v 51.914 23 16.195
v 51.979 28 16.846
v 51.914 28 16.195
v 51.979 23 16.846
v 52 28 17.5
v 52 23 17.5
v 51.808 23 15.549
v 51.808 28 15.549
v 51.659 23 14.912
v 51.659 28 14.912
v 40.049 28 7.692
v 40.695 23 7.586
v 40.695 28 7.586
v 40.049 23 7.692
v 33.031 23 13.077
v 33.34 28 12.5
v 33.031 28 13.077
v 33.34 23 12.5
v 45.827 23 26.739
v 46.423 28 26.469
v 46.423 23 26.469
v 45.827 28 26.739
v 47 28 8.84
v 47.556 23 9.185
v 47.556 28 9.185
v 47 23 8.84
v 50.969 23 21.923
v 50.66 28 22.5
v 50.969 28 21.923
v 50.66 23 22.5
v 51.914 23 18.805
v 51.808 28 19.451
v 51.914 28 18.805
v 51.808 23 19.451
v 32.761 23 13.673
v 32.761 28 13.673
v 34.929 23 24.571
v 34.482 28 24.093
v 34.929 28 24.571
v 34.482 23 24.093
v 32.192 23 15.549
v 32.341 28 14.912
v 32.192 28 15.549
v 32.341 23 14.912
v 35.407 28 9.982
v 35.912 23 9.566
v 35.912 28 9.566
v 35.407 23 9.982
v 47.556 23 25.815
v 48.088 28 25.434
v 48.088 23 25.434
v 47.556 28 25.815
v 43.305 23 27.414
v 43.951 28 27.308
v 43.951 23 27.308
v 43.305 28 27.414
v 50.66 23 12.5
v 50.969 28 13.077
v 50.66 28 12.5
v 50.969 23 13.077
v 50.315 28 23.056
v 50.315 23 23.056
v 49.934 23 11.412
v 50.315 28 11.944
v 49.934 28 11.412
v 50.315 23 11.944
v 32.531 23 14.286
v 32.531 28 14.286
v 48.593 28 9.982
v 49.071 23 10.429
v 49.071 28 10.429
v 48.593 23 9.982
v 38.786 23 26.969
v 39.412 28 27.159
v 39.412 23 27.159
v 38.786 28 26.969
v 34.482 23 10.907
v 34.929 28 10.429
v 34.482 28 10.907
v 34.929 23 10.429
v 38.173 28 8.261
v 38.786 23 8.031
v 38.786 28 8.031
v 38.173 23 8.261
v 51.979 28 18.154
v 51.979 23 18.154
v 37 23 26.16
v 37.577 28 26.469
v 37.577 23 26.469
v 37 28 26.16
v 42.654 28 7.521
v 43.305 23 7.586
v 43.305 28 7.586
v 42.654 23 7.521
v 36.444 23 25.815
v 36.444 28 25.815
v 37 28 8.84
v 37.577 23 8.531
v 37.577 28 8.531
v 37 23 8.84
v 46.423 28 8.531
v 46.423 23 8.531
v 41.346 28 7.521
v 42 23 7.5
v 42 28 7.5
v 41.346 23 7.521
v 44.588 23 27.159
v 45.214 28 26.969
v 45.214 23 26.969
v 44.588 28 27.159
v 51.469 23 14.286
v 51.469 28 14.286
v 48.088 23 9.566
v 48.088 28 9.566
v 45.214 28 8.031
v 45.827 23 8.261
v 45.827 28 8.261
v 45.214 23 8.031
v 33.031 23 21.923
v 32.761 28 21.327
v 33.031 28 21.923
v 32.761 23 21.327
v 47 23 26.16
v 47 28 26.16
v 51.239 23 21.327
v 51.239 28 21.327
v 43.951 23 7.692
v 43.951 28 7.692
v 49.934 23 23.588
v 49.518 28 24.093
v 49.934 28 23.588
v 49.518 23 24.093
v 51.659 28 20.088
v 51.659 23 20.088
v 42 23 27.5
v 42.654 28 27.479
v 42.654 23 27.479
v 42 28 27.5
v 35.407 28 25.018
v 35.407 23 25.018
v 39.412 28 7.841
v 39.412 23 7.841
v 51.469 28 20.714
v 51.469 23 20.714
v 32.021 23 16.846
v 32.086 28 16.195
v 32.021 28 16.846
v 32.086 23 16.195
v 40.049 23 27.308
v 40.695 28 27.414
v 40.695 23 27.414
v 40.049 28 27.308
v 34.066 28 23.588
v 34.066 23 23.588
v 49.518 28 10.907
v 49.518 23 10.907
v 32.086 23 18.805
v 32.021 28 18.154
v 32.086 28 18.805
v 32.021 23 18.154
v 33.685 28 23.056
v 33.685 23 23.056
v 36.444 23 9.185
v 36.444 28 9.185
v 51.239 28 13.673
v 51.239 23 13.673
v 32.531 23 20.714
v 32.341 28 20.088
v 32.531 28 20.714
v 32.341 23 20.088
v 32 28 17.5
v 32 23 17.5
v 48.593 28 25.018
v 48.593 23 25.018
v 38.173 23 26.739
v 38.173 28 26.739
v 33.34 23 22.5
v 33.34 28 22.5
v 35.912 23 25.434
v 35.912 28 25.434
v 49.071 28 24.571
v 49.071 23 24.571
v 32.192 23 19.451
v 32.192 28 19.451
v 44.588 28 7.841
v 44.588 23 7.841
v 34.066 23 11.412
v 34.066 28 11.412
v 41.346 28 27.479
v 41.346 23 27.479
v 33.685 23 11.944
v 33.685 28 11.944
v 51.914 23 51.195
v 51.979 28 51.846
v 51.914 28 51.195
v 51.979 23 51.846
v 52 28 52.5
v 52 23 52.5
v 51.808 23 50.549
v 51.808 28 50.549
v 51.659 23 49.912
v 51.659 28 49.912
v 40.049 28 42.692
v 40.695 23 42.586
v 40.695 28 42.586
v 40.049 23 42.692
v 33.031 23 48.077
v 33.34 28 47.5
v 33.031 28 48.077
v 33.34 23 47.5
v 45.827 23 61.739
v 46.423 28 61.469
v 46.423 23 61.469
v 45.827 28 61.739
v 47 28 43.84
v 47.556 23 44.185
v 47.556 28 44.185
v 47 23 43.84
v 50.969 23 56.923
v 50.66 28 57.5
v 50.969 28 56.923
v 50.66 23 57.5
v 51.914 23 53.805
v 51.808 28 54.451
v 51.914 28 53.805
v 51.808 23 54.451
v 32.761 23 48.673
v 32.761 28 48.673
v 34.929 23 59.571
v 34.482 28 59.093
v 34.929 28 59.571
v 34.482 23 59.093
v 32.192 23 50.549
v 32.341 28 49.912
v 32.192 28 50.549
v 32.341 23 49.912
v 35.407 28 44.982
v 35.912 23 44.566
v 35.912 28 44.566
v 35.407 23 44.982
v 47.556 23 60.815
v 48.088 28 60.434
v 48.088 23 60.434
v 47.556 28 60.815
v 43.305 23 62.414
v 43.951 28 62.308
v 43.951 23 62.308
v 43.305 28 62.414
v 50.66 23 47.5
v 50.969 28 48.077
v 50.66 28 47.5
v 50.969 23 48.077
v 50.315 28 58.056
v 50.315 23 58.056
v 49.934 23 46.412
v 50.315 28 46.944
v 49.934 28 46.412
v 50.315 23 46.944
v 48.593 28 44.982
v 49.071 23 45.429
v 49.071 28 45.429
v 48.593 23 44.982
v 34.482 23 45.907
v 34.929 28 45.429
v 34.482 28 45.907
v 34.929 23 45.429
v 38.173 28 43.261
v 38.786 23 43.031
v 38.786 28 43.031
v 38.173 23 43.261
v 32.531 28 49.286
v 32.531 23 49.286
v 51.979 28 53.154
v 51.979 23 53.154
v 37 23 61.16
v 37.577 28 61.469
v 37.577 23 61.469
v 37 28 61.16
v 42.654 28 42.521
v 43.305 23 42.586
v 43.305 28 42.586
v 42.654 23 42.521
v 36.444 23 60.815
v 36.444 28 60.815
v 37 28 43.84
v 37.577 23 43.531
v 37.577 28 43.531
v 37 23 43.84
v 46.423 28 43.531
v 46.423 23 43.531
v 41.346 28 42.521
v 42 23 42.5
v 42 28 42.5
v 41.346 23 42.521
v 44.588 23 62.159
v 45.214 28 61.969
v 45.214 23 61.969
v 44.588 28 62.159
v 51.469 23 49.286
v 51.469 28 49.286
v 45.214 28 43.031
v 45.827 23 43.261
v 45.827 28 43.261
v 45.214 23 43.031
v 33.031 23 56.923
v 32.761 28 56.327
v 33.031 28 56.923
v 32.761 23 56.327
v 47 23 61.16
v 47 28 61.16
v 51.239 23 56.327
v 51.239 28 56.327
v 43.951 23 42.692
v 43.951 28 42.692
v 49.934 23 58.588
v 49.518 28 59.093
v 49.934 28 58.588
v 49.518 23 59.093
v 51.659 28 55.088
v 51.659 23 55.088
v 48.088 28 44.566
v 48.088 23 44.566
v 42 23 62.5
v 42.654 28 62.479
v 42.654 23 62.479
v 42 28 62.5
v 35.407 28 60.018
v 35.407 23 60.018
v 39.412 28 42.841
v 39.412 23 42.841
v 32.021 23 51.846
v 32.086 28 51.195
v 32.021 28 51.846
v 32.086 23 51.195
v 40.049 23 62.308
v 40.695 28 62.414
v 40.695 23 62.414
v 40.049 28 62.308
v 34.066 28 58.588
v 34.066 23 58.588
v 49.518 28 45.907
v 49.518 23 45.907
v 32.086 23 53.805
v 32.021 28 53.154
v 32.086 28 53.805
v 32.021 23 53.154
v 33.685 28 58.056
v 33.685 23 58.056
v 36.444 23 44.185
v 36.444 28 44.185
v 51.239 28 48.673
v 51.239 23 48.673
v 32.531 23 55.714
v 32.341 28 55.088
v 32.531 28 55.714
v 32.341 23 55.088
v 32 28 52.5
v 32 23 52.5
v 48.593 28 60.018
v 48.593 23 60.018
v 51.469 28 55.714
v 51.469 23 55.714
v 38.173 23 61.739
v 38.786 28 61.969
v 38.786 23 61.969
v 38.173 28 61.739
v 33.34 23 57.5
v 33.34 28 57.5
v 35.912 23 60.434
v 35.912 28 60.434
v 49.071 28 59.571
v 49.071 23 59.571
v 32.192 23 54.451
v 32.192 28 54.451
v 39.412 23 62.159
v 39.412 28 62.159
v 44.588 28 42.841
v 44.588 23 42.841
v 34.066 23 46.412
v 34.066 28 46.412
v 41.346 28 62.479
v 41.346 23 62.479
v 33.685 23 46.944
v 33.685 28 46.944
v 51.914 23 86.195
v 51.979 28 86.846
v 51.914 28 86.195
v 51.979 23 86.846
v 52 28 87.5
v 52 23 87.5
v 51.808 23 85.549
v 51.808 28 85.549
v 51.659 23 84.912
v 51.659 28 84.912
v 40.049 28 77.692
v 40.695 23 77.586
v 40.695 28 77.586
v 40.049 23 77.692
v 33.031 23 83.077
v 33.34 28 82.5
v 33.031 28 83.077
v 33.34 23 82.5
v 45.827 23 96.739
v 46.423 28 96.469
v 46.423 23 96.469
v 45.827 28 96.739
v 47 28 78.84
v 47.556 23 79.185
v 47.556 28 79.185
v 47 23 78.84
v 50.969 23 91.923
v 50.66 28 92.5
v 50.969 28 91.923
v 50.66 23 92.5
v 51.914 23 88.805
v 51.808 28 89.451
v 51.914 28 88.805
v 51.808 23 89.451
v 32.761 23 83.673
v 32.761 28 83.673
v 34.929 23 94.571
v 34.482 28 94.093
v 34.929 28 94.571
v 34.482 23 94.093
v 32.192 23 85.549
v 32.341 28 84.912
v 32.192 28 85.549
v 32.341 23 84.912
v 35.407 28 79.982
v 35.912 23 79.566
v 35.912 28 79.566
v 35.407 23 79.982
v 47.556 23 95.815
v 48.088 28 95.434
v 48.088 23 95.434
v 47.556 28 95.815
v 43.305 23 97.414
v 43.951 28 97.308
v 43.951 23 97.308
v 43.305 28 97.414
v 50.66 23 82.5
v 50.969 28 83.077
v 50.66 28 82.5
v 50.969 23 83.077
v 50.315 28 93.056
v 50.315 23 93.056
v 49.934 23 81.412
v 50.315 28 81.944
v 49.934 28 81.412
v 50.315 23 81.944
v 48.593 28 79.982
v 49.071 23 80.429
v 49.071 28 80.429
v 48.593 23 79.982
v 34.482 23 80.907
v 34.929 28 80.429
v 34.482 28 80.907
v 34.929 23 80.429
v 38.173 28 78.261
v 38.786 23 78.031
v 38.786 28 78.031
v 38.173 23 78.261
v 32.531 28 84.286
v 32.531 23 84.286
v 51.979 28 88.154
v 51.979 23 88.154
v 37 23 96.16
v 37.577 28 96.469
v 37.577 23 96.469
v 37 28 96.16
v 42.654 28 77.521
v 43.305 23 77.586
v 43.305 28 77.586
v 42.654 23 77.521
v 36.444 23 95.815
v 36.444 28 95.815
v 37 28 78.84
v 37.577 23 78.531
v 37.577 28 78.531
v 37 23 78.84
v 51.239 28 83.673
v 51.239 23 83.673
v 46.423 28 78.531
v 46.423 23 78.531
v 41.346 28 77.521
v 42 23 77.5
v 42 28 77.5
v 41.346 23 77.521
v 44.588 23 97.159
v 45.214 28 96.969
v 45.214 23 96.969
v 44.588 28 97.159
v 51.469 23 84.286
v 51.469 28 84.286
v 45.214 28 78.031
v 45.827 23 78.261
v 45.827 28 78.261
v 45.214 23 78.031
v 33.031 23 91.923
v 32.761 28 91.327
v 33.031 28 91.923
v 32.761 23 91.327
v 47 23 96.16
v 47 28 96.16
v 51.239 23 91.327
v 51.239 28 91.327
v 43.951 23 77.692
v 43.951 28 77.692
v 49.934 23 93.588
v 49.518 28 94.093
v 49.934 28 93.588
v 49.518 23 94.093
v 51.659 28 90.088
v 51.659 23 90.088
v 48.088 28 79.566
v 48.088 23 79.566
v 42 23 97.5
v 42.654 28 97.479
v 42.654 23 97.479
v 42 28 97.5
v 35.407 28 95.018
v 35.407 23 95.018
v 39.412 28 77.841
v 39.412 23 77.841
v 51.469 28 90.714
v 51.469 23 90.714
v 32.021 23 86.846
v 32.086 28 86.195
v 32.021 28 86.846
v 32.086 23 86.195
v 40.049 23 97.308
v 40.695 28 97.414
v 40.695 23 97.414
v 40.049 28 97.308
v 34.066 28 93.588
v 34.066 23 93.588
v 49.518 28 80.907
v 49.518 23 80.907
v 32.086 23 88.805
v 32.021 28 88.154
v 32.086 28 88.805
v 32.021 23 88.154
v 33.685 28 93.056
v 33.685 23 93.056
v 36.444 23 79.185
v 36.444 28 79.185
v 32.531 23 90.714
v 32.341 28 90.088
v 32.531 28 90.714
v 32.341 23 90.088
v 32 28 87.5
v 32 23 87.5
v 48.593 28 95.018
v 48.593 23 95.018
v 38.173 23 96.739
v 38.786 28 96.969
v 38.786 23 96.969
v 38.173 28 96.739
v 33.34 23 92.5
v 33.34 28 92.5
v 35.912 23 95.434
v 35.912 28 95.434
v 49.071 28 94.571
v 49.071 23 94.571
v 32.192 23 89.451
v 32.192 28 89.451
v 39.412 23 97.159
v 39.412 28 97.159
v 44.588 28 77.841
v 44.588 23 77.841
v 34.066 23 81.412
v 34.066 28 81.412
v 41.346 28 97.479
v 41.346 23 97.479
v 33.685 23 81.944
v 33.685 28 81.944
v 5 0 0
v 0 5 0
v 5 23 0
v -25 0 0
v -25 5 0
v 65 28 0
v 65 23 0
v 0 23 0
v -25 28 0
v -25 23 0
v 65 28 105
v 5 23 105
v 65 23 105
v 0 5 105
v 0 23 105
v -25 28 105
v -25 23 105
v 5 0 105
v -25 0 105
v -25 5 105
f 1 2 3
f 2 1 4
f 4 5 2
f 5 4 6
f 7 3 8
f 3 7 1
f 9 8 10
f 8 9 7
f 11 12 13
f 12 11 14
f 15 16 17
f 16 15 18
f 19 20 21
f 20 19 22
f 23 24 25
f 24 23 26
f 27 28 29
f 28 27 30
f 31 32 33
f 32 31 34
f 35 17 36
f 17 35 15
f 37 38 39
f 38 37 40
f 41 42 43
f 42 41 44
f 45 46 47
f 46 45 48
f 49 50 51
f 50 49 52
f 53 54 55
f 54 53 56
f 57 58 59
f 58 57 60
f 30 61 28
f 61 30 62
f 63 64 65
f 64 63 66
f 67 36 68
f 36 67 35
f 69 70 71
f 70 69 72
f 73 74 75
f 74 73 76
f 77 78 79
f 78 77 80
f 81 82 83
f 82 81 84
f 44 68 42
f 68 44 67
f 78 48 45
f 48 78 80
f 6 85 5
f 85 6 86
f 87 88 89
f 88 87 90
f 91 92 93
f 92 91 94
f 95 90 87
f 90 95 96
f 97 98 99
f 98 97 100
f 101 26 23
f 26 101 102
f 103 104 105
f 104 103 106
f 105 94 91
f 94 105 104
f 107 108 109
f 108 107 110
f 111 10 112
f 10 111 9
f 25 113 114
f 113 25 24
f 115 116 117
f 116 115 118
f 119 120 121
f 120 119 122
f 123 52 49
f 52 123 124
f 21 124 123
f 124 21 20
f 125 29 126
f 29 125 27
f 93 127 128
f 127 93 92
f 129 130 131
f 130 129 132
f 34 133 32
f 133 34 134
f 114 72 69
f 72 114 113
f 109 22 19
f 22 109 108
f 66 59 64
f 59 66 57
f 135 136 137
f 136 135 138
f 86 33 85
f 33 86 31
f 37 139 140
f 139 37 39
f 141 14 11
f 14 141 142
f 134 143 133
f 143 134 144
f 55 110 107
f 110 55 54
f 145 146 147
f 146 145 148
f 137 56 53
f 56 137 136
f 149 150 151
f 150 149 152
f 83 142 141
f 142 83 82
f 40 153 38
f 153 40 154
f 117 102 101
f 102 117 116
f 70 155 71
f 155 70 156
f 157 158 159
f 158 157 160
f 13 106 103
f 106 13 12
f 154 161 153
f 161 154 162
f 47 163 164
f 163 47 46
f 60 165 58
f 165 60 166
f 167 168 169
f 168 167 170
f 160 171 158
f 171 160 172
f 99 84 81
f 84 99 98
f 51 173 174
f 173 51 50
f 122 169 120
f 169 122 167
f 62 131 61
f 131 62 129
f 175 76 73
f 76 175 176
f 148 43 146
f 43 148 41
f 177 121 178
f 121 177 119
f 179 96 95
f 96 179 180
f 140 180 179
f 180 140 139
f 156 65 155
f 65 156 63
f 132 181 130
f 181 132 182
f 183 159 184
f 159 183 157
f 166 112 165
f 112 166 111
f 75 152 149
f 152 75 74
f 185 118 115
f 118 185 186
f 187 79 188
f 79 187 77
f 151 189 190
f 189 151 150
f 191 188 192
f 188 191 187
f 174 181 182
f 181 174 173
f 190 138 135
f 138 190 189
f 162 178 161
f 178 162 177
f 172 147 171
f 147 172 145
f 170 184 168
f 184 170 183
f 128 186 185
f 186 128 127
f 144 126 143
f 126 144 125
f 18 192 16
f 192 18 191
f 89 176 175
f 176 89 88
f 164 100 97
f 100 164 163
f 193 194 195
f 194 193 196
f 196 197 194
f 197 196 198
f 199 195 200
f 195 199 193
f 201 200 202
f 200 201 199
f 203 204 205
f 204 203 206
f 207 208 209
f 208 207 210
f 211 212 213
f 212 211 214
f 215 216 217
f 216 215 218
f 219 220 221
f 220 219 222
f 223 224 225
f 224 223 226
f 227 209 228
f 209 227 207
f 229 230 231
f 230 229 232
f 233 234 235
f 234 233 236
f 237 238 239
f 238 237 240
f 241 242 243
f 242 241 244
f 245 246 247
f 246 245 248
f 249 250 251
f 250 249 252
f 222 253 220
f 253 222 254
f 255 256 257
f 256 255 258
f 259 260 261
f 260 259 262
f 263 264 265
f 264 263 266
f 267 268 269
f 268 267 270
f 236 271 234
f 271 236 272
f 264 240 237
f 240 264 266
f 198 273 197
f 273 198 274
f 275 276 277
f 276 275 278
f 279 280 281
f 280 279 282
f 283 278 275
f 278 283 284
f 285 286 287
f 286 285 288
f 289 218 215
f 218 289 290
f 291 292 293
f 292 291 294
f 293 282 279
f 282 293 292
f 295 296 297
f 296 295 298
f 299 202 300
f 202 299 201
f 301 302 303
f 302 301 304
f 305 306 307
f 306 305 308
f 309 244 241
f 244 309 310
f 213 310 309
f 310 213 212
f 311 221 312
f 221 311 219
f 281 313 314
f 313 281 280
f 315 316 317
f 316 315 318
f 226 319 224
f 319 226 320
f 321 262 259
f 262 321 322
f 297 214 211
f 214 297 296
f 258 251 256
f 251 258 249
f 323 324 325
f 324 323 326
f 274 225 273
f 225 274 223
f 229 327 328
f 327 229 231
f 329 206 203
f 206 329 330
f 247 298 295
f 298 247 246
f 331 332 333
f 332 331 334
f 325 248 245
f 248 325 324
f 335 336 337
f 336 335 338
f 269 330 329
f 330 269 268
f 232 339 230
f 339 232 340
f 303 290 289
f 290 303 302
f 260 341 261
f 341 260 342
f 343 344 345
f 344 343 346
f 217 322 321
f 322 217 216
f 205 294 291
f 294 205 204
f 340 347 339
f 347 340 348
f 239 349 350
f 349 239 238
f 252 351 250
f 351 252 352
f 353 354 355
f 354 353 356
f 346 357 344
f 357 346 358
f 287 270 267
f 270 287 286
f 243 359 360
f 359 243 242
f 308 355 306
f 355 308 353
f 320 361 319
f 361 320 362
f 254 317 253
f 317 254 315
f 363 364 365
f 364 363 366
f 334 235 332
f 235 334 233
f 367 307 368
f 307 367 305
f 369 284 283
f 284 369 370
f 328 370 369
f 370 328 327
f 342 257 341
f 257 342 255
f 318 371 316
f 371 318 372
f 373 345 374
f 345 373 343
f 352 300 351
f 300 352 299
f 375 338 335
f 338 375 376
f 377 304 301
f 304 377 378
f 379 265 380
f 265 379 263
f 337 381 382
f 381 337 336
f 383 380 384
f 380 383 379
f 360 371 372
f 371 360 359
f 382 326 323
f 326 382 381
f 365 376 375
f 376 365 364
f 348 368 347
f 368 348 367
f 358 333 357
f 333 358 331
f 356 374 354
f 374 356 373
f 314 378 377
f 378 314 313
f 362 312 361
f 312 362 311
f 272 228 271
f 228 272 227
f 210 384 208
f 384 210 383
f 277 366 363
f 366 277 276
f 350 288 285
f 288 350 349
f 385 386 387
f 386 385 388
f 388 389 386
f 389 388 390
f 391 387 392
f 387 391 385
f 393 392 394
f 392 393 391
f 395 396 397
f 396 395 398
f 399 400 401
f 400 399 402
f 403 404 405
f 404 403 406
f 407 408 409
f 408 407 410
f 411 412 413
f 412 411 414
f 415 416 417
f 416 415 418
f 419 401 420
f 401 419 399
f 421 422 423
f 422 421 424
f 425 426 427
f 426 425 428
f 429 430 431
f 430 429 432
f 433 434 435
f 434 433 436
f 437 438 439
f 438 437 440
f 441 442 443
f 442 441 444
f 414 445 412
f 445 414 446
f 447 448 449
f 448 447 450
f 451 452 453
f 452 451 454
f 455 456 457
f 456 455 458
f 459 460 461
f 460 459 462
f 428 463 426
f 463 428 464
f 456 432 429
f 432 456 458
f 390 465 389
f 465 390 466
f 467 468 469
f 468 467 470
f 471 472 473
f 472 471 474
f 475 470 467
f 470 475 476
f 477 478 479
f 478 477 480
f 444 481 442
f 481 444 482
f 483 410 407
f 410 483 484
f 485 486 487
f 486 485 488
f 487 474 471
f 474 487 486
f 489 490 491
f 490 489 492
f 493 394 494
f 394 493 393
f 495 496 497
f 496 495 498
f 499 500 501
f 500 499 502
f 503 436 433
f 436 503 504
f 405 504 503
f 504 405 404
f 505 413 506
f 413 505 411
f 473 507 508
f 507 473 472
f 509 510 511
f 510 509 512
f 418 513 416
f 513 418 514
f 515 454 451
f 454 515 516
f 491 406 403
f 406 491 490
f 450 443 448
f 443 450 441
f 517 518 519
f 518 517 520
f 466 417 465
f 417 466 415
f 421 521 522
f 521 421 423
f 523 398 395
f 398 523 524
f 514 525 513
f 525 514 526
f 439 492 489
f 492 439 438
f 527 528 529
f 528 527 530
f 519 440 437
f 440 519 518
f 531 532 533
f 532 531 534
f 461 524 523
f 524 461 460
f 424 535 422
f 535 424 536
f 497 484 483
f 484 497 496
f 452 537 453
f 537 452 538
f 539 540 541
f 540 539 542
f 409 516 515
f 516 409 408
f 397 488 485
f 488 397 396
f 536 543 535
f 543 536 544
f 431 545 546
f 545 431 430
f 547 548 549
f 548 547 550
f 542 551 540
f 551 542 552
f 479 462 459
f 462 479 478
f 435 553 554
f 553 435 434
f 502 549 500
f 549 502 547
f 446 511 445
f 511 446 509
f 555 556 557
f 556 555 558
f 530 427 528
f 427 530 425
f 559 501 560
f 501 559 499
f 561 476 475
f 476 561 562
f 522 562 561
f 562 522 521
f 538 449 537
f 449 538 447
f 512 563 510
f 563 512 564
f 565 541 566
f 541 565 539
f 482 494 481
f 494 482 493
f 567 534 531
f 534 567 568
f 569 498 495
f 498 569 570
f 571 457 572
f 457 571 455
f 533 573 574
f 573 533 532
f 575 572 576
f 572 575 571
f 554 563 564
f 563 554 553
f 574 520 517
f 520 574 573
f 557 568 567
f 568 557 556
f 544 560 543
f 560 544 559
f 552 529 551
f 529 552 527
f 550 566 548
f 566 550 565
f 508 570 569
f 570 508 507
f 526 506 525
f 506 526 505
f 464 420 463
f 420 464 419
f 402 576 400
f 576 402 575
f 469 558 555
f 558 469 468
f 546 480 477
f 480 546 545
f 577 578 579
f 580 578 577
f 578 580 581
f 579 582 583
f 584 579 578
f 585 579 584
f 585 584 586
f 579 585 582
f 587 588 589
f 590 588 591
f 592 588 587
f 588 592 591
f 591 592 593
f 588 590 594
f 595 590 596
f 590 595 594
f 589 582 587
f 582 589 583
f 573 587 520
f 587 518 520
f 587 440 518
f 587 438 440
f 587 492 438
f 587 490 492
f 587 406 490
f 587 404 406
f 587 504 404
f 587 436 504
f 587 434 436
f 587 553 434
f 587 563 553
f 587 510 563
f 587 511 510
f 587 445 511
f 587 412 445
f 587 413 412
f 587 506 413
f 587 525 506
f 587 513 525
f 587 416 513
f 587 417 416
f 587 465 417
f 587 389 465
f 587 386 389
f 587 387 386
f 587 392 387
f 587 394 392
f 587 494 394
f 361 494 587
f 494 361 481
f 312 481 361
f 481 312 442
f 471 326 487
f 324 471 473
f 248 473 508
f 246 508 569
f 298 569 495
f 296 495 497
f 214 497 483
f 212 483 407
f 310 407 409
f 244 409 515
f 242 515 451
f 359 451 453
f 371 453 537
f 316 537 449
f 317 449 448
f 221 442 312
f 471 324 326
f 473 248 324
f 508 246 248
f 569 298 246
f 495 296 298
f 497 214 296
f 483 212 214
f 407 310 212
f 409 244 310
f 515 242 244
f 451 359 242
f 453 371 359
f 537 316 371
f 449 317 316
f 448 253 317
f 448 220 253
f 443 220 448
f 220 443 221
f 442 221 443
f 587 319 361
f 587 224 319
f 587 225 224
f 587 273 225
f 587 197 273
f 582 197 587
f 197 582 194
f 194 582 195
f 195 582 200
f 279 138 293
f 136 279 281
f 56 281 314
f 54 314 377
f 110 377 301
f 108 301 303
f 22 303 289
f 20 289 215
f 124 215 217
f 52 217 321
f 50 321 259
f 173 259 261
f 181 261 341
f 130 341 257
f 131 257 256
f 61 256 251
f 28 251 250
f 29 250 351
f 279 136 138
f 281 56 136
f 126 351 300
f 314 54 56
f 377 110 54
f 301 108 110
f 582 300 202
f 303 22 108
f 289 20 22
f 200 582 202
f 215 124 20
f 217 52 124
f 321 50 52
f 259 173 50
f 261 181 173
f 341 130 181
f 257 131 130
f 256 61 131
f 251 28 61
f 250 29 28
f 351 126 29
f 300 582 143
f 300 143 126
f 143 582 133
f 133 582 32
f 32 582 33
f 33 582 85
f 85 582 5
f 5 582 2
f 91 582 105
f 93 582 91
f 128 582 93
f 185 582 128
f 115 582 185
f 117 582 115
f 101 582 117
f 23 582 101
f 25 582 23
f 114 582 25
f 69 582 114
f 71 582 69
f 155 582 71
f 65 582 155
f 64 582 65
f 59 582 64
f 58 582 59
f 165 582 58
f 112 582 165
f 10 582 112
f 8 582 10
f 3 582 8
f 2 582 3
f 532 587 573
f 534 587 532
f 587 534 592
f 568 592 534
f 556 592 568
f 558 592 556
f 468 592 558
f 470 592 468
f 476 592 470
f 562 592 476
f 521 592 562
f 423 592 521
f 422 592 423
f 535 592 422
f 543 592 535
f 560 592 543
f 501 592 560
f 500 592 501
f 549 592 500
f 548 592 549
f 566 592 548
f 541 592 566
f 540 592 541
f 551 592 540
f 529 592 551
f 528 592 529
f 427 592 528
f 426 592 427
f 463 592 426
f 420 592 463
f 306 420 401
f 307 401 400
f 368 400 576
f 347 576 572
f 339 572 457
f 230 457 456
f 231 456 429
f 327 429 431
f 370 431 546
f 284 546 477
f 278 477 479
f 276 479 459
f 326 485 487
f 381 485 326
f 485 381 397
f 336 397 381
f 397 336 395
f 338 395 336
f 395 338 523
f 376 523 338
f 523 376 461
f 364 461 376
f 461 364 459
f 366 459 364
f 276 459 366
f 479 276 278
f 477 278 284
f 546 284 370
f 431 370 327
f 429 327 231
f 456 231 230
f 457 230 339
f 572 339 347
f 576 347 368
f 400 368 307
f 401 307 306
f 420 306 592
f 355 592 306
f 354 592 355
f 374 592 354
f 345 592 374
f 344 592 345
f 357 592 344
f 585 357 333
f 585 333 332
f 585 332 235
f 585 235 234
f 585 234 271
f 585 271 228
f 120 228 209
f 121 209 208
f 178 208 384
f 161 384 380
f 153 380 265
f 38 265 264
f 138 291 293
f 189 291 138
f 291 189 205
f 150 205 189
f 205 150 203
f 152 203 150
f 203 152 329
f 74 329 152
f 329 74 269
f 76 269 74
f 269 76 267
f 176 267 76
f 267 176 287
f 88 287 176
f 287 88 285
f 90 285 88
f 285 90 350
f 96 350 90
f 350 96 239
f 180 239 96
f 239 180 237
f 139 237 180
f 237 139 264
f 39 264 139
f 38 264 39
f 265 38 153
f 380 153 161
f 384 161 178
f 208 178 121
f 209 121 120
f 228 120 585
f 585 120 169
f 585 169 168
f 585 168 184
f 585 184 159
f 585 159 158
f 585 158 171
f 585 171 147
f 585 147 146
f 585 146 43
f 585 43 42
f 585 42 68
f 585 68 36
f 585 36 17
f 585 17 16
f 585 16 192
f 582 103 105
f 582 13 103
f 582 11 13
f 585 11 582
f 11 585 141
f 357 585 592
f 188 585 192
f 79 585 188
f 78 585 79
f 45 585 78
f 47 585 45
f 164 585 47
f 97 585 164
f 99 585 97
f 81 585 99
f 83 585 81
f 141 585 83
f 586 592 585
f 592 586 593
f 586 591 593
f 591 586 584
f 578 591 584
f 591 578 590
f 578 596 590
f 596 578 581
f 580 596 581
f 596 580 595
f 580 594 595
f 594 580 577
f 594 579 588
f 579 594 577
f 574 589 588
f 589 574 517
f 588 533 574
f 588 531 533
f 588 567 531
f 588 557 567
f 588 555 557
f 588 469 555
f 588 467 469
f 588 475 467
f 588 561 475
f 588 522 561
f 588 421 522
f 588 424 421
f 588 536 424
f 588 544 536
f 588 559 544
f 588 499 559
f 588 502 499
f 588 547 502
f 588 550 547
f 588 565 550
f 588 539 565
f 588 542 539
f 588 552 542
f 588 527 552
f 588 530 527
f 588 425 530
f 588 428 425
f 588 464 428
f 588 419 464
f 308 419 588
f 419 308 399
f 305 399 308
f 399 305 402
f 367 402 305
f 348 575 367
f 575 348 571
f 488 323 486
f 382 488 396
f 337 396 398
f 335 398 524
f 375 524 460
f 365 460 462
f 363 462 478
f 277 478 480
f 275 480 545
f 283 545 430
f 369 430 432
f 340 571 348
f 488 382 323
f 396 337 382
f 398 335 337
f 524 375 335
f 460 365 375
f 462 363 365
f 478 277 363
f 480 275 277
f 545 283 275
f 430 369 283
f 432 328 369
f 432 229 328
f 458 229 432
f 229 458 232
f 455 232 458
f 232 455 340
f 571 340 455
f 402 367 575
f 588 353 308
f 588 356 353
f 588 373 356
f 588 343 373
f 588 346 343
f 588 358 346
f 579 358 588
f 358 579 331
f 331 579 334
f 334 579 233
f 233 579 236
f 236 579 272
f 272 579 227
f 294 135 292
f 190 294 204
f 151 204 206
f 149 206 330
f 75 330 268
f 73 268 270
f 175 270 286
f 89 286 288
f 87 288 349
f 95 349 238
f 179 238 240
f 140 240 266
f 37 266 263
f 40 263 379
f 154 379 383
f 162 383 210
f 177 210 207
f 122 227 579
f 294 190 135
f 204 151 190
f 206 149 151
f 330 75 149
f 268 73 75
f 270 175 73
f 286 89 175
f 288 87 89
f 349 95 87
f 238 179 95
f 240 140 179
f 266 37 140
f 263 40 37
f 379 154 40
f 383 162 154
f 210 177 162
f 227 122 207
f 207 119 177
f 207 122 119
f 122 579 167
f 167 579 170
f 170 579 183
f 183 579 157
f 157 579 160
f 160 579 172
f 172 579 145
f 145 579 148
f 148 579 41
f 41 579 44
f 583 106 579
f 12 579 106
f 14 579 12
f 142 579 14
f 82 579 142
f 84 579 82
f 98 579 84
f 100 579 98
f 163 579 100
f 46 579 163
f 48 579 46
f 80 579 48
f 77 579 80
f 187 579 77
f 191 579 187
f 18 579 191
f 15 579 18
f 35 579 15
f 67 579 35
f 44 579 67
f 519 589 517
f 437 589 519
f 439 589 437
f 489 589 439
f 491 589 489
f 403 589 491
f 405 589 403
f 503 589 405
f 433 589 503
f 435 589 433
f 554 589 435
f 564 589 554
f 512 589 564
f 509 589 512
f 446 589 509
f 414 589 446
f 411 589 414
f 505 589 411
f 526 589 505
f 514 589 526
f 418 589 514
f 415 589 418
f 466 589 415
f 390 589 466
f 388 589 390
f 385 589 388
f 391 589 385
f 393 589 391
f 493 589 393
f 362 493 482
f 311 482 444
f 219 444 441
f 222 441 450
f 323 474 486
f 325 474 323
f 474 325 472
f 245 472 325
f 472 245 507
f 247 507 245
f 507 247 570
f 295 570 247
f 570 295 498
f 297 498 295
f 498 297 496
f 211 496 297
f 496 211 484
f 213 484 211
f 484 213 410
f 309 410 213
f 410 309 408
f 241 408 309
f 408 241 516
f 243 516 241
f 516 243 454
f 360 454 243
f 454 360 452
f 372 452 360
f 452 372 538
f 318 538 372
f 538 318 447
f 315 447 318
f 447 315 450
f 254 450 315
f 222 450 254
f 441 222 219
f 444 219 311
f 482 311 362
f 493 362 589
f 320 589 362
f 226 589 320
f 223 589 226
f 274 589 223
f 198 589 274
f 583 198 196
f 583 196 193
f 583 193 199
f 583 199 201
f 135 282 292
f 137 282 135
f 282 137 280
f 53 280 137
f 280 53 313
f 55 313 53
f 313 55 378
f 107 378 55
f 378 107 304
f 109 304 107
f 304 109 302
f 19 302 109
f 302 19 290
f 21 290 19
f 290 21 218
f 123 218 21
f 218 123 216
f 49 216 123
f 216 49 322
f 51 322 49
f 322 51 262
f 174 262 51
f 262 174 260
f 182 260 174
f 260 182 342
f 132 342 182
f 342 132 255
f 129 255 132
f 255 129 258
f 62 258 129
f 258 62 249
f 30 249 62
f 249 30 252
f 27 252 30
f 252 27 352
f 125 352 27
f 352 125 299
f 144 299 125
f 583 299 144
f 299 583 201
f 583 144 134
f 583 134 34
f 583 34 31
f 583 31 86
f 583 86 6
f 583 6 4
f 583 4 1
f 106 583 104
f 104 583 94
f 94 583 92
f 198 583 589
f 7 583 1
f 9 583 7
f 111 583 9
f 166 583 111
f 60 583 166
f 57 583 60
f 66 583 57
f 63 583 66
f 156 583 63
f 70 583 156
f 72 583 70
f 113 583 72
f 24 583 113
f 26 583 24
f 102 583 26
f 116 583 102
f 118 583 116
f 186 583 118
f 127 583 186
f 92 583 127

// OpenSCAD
// KNOWN-WRONG PART (must fail): the jaw gap is 18 mm (no clearance) instead of 18.4
// Holder for 3 single-channel pipettes that clamps onto the front edge of an 18 mm shelf
// Category: quick fixes. A C-shaped clamp (spine, bottom jaw, top jaw) whose top jaw continues
// forward as an arm with three 20 mm holes; each pipette drops in and hangs by its handle.
// Modelled in print orientation: lying on its side, the profile in XY extruded along Z
// (in use +Y is up and +X points away from the shelf), so the jaws print as plain walls.
// Print: PETG (springier than PLA), 0.2 mm layers, 4 perimeters.
// SPDX-License-Identifier: CERN-OHL-P-2.0

/* [Holder] */
width = 105;              // extrusion length (along the shelf edge)
spine = [0, 5];           // x from, x to
jaw_back = -25;           // both jaws reach back to x = -25
jaw_t = 5;
gap = 18;                 // 18 mm shelf + clearance
arm_front = 65;           // the top jaw continues forward to x = 65
hole_d = 20;
hole_x = 42;
hole_z = [17.5, 52.5, 87.5];

/* [Hidden] */
eps = 0.01;
H = jaw_t + gap + jaw_t;  // 28.4

difference() {
    linear_extrude(width) union() {
        translate([spine[0], 0]) square([spine[1] - spine[0], H]);
        translate([jaw_back, 0]) square([spine[1] - jaw_back, jaw_t]);
        translate([jaw_back, H - jaw_t]) square([arm_front - jaw_back, jaw_t]);
    }
    for (z = hole_z)
        translate([hole_x, H - jaw_t - 1, z]) rotate([-90, 0, 0]) cylinder(d = hole_d, h = jaw_t + 2, $fn = 96);
}
